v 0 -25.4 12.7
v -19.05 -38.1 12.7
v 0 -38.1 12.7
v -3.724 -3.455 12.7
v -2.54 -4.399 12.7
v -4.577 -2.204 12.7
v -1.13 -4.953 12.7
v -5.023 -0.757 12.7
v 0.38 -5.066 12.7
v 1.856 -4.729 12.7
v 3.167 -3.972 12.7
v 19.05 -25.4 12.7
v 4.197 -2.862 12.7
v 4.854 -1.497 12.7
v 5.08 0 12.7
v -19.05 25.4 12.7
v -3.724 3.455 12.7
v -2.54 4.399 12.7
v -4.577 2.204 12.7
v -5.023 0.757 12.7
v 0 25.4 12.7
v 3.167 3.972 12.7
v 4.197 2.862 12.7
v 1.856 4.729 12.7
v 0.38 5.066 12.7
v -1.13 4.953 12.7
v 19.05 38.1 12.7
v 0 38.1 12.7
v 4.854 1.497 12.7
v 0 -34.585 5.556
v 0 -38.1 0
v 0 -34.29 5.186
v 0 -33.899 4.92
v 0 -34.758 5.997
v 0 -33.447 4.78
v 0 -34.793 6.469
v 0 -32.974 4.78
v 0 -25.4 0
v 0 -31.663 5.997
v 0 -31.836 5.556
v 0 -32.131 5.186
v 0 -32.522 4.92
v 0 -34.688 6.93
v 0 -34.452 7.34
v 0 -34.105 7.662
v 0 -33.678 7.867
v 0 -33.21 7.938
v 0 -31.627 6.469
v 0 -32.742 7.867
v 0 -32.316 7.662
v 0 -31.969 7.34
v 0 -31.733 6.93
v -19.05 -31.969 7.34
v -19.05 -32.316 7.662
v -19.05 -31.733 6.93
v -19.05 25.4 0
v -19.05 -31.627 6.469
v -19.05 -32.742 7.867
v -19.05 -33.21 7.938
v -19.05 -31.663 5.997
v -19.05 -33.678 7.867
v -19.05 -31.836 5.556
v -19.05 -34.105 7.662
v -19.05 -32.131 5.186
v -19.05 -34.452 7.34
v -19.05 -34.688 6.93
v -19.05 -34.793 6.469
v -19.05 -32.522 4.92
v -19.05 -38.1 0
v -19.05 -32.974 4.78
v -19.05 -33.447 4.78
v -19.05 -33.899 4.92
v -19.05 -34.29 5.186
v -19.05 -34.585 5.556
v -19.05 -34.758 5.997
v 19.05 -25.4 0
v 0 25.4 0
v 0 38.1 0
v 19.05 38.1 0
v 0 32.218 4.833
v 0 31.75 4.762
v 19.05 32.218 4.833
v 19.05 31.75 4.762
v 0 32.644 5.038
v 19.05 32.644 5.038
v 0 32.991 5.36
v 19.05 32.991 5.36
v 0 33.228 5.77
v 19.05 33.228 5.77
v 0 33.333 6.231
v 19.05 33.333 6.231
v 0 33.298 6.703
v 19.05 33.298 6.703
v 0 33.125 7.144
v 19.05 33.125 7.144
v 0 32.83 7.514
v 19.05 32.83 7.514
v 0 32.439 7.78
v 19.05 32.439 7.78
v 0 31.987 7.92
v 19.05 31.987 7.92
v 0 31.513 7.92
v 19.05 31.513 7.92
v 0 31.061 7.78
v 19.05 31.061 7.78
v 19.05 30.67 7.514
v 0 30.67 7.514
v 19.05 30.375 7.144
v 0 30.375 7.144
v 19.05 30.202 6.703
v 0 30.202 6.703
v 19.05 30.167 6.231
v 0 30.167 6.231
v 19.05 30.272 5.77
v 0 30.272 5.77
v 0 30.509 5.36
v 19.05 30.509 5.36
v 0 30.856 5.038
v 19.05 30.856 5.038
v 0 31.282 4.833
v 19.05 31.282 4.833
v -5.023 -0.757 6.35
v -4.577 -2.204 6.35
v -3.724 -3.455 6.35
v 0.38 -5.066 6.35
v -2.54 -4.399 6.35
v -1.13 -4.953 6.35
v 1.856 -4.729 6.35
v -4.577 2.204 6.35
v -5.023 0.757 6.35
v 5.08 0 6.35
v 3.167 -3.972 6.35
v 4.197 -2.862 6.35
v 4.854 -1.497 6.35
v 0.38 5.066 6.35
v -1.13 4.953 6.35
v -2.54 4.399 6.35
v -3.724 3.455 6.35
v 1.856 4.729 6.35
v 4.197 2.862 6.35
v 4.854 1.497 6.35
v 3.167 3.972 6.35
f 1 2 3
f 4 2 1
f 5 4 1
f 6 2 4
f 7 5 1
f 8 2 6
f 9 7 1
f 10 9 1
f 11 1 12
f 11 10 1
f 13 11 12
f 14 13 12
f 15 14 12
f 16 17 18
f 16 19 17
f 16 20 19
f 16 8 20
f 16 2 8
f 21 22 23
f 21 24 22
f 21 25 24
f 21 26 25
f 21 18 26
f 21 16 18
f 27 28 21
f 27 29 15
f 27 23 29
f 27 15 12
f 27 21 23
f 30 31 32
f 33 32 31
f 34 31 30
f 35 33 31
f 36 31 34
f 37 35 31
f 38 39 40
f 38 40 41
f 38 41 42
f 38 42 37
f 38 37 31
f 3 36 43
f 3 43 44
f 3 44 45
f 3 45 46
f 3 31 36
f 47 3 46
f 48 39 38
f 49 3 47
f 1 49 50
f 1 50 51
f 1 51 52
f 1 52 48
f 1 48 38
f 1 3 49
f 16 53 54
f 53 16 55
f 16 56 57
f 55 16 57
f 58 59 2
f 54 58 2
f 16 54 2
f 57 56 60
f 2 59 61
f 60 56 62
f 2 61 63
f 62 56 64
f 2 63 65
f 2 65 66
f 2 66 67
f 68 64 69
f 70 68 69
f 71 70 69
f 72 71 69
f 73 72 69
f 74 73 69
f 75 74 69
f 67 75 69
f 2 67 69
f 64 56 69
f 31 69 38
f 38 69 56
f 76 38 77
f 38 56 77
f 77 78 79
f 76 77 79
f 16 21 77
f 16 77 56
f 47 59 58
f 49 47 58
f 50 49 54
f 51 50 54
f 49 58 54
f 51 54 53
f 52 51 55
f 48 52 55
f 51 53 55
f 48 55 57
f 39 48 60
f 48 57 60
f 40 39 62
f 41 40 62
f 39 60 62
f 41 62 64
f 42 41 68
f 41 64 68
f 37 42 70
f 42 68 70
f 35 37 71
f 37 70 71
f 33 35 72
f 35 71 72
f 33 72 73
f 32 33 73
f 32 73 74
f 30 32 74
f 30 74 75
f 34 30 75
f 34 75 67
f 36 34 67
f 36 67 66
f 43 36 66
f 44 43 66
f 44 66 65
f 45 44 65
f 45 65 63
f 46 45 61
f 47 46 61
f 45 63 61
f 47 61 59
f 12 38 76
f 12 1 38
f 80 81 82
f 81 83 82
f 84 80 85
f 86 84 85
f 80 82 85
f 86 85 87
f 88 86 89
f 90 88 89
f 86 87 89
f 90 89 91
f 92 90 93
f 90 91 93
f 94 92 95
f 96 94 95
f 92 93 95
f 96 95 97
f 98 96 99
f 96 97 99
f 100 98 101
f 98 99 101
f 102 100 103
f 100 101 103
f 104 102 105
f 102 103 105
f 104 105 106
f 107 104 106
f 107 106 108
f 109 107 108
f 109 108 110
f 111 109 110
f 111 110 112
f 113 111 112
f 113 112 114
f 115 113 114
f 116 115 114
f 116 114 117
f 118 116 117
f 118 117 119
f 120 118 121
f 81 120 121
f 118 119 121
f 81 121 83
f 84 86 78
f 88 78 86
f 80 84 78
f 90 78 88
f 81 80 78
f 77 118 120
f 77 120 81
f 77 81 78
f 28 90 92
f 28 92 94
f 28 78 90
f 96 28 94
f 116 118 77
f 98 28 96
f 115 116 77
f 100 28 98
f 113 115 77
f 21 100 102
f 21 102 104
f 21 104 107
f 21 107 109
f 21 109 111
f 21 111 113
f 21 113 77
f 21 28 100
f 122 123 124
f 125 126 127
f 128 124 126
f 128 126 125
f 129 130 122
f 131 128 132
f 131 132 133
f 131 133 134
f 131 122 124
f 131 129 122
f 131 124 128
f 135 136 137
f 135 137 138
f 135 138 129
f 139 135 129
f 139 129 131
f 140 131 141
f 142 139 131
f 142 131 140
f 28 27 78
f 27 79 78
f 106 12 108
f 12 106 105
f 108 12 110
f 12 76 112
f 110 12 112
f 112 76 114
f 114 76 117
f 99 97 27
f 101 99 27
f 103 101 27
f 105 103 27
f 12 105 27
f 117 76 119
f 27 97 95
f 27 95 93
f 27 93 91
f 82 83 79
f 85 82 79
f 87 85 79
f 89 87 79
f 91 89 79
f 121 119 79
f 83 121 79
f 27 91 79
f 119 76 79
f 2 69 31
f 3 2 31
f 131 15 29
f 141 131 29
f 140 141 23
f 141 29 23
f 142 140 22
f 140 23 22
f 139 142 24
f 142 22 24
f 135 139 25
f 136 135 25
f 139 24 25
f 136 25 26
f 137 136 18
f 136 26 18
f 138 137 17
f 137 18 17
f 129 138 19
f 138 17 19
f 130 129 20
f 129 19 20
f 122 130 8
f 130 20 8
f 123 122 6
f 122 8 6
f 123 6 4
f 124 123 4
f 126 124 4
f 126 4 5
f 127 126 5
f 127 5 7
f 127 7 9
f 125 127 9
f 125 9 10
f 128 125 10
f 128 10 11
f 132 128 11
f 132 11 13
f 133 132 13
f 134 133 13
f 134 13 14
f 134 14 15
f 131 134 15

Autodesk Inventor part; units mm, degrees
ref_plane "YZ Plane" through (0, 0, 0) normal (1, 0, 0) x (0, 1, 0)
ref_plane "XZ Plane" through (0, 0, 0) normal (0, 1, 0) x (-1, 0, 0)
ref_plane "XY Plane" through (0, 0, 0) normal (0, 0, 1) x (1, 0, 0)
sketch "Sketch1" plane through (0, 0, 0) normal (0, 0, 1) x (1, 0, 0)
  line L0 (-19.05, -38.1) -> (19.05, -38.1)
  line L1 (19.05, -38.1) -> (19.05, 38.1)
  line L2 (19.05, 38.1) -> (-19.05, 38.1)
  line L3 (-19.05, 38.1) -> (-19.05, -38.1)
  line L4 (-19.05, -38.1) -> (19.05, 38.1) construction
  line L5 (19.05, -38.1) -> (-19.05, 38.1) construction
  point P0 (0, 0)
  dimension "d0" = 38.1
  dimension "d1" = 76.2
extrude "Extrusion1" add sketch "Sketch1" along normal blind 12.7
sketch "Sketch2" plane through (0, 0, 12.7) normal (0, 0, 1) x (1, 0, 0)
  line L0 (-19.05, 38.1) -> (0, 38.1)
  line L1 (0, 38.1) -> (0, 25.4)
  line L2 (0, 25.4) -> (-19.05, 25.4)
  line L3 (-19.05, 25.4) -> (-19.05, 38.1)
  point P0 (0, 0)
  dimension "d4" = 19.05
  dimension "d5" = 12.7
extrude "Extrusion2" cut sketch "Sketch2" against normal blind 12.7
sketch "Sketch3" plane through (0, 0, 12.7) normal (0, 0, 1) x (1, 0, 0)
  line L0 (19.05, -38.1) -> (0, -38.1)
  line L1 (0, -38.1) -> (0, -25.4)
  line L2 (0, -25.4) -> (19.05, -25.4)
  line L3 (19.05, -25.4) -> (19.05, -38.1)
  point P0 (0, 0)
  dimension "d8" = 19.05
  dimension "d9" = 12.7
extrude "Extrusion3" cut sketch "Sketch3" against normal blind 12.7
sketch "Sketch4" plane through (0, 0, 12.7) normal (0, 0, 1) x (1, 0, 0)
  circle A0 centre (0, 0) radius 5.08
  dimension "d12" = 10.16
extrude "Extrusion4" cut sketch "Sketch4" against normal blind 6.35
sketch "Sketch5" plane through (19.05, 38.1, 12.7) normal (1, 0, 0) x (0, 0, -1)
  line L0 (12.7, -76.2) -> (12.7, 0) projected
  line L1 (12.7, 0) -> (0, 0) projected
  line L2 (0, -63.5) -> (0, 0) projected
  line L3 (0, -12.7) -> (12.7, -12.7) projected
  circle A0 centre (6.35, -6.35) radius 1.5875
  point P0 (12.7, -63.5)
  point P1 (12.7, -38.1)
  dimension "d16" = 3.175
  dimension "d17" = 6.35
  dimension "d18" = 6.35
  dimension "d19" = 6.35
  dimension "d20" = 6.35
extrude "Extrusion5" cut sketch "Sketch5" against normal blind 19.05 contours A0
sketch "Sketch9" plane through (-19.05, -38.1, 0) normal (-1, 0, 0) x (0, 0, 1)
  line L0 (0, 0) -> (12.7, 0) projected
  line L1 (12.7, 63.5) -> (12.7, 0) projected
  line L2 (12.7, 9.7791) -> (0, 9.7791) projected
  circle A0 centre (6.35, 4.8896) radius 1.5875
  point P0 (0, 38.1)
  dimension "d34" = 3.175
  dimension "d35" = 6.35
  dimension "d36" = 4.8896
  dimension "d37" = 4.8896
extrude "Extrusion9" cut sketch "Sketch9" against normal blind 19.05
equation "\"d17\" = d18"
equation "\"d19\" = d20"
equation "\"d36\" = d37"
properties part number "MotorMount"
